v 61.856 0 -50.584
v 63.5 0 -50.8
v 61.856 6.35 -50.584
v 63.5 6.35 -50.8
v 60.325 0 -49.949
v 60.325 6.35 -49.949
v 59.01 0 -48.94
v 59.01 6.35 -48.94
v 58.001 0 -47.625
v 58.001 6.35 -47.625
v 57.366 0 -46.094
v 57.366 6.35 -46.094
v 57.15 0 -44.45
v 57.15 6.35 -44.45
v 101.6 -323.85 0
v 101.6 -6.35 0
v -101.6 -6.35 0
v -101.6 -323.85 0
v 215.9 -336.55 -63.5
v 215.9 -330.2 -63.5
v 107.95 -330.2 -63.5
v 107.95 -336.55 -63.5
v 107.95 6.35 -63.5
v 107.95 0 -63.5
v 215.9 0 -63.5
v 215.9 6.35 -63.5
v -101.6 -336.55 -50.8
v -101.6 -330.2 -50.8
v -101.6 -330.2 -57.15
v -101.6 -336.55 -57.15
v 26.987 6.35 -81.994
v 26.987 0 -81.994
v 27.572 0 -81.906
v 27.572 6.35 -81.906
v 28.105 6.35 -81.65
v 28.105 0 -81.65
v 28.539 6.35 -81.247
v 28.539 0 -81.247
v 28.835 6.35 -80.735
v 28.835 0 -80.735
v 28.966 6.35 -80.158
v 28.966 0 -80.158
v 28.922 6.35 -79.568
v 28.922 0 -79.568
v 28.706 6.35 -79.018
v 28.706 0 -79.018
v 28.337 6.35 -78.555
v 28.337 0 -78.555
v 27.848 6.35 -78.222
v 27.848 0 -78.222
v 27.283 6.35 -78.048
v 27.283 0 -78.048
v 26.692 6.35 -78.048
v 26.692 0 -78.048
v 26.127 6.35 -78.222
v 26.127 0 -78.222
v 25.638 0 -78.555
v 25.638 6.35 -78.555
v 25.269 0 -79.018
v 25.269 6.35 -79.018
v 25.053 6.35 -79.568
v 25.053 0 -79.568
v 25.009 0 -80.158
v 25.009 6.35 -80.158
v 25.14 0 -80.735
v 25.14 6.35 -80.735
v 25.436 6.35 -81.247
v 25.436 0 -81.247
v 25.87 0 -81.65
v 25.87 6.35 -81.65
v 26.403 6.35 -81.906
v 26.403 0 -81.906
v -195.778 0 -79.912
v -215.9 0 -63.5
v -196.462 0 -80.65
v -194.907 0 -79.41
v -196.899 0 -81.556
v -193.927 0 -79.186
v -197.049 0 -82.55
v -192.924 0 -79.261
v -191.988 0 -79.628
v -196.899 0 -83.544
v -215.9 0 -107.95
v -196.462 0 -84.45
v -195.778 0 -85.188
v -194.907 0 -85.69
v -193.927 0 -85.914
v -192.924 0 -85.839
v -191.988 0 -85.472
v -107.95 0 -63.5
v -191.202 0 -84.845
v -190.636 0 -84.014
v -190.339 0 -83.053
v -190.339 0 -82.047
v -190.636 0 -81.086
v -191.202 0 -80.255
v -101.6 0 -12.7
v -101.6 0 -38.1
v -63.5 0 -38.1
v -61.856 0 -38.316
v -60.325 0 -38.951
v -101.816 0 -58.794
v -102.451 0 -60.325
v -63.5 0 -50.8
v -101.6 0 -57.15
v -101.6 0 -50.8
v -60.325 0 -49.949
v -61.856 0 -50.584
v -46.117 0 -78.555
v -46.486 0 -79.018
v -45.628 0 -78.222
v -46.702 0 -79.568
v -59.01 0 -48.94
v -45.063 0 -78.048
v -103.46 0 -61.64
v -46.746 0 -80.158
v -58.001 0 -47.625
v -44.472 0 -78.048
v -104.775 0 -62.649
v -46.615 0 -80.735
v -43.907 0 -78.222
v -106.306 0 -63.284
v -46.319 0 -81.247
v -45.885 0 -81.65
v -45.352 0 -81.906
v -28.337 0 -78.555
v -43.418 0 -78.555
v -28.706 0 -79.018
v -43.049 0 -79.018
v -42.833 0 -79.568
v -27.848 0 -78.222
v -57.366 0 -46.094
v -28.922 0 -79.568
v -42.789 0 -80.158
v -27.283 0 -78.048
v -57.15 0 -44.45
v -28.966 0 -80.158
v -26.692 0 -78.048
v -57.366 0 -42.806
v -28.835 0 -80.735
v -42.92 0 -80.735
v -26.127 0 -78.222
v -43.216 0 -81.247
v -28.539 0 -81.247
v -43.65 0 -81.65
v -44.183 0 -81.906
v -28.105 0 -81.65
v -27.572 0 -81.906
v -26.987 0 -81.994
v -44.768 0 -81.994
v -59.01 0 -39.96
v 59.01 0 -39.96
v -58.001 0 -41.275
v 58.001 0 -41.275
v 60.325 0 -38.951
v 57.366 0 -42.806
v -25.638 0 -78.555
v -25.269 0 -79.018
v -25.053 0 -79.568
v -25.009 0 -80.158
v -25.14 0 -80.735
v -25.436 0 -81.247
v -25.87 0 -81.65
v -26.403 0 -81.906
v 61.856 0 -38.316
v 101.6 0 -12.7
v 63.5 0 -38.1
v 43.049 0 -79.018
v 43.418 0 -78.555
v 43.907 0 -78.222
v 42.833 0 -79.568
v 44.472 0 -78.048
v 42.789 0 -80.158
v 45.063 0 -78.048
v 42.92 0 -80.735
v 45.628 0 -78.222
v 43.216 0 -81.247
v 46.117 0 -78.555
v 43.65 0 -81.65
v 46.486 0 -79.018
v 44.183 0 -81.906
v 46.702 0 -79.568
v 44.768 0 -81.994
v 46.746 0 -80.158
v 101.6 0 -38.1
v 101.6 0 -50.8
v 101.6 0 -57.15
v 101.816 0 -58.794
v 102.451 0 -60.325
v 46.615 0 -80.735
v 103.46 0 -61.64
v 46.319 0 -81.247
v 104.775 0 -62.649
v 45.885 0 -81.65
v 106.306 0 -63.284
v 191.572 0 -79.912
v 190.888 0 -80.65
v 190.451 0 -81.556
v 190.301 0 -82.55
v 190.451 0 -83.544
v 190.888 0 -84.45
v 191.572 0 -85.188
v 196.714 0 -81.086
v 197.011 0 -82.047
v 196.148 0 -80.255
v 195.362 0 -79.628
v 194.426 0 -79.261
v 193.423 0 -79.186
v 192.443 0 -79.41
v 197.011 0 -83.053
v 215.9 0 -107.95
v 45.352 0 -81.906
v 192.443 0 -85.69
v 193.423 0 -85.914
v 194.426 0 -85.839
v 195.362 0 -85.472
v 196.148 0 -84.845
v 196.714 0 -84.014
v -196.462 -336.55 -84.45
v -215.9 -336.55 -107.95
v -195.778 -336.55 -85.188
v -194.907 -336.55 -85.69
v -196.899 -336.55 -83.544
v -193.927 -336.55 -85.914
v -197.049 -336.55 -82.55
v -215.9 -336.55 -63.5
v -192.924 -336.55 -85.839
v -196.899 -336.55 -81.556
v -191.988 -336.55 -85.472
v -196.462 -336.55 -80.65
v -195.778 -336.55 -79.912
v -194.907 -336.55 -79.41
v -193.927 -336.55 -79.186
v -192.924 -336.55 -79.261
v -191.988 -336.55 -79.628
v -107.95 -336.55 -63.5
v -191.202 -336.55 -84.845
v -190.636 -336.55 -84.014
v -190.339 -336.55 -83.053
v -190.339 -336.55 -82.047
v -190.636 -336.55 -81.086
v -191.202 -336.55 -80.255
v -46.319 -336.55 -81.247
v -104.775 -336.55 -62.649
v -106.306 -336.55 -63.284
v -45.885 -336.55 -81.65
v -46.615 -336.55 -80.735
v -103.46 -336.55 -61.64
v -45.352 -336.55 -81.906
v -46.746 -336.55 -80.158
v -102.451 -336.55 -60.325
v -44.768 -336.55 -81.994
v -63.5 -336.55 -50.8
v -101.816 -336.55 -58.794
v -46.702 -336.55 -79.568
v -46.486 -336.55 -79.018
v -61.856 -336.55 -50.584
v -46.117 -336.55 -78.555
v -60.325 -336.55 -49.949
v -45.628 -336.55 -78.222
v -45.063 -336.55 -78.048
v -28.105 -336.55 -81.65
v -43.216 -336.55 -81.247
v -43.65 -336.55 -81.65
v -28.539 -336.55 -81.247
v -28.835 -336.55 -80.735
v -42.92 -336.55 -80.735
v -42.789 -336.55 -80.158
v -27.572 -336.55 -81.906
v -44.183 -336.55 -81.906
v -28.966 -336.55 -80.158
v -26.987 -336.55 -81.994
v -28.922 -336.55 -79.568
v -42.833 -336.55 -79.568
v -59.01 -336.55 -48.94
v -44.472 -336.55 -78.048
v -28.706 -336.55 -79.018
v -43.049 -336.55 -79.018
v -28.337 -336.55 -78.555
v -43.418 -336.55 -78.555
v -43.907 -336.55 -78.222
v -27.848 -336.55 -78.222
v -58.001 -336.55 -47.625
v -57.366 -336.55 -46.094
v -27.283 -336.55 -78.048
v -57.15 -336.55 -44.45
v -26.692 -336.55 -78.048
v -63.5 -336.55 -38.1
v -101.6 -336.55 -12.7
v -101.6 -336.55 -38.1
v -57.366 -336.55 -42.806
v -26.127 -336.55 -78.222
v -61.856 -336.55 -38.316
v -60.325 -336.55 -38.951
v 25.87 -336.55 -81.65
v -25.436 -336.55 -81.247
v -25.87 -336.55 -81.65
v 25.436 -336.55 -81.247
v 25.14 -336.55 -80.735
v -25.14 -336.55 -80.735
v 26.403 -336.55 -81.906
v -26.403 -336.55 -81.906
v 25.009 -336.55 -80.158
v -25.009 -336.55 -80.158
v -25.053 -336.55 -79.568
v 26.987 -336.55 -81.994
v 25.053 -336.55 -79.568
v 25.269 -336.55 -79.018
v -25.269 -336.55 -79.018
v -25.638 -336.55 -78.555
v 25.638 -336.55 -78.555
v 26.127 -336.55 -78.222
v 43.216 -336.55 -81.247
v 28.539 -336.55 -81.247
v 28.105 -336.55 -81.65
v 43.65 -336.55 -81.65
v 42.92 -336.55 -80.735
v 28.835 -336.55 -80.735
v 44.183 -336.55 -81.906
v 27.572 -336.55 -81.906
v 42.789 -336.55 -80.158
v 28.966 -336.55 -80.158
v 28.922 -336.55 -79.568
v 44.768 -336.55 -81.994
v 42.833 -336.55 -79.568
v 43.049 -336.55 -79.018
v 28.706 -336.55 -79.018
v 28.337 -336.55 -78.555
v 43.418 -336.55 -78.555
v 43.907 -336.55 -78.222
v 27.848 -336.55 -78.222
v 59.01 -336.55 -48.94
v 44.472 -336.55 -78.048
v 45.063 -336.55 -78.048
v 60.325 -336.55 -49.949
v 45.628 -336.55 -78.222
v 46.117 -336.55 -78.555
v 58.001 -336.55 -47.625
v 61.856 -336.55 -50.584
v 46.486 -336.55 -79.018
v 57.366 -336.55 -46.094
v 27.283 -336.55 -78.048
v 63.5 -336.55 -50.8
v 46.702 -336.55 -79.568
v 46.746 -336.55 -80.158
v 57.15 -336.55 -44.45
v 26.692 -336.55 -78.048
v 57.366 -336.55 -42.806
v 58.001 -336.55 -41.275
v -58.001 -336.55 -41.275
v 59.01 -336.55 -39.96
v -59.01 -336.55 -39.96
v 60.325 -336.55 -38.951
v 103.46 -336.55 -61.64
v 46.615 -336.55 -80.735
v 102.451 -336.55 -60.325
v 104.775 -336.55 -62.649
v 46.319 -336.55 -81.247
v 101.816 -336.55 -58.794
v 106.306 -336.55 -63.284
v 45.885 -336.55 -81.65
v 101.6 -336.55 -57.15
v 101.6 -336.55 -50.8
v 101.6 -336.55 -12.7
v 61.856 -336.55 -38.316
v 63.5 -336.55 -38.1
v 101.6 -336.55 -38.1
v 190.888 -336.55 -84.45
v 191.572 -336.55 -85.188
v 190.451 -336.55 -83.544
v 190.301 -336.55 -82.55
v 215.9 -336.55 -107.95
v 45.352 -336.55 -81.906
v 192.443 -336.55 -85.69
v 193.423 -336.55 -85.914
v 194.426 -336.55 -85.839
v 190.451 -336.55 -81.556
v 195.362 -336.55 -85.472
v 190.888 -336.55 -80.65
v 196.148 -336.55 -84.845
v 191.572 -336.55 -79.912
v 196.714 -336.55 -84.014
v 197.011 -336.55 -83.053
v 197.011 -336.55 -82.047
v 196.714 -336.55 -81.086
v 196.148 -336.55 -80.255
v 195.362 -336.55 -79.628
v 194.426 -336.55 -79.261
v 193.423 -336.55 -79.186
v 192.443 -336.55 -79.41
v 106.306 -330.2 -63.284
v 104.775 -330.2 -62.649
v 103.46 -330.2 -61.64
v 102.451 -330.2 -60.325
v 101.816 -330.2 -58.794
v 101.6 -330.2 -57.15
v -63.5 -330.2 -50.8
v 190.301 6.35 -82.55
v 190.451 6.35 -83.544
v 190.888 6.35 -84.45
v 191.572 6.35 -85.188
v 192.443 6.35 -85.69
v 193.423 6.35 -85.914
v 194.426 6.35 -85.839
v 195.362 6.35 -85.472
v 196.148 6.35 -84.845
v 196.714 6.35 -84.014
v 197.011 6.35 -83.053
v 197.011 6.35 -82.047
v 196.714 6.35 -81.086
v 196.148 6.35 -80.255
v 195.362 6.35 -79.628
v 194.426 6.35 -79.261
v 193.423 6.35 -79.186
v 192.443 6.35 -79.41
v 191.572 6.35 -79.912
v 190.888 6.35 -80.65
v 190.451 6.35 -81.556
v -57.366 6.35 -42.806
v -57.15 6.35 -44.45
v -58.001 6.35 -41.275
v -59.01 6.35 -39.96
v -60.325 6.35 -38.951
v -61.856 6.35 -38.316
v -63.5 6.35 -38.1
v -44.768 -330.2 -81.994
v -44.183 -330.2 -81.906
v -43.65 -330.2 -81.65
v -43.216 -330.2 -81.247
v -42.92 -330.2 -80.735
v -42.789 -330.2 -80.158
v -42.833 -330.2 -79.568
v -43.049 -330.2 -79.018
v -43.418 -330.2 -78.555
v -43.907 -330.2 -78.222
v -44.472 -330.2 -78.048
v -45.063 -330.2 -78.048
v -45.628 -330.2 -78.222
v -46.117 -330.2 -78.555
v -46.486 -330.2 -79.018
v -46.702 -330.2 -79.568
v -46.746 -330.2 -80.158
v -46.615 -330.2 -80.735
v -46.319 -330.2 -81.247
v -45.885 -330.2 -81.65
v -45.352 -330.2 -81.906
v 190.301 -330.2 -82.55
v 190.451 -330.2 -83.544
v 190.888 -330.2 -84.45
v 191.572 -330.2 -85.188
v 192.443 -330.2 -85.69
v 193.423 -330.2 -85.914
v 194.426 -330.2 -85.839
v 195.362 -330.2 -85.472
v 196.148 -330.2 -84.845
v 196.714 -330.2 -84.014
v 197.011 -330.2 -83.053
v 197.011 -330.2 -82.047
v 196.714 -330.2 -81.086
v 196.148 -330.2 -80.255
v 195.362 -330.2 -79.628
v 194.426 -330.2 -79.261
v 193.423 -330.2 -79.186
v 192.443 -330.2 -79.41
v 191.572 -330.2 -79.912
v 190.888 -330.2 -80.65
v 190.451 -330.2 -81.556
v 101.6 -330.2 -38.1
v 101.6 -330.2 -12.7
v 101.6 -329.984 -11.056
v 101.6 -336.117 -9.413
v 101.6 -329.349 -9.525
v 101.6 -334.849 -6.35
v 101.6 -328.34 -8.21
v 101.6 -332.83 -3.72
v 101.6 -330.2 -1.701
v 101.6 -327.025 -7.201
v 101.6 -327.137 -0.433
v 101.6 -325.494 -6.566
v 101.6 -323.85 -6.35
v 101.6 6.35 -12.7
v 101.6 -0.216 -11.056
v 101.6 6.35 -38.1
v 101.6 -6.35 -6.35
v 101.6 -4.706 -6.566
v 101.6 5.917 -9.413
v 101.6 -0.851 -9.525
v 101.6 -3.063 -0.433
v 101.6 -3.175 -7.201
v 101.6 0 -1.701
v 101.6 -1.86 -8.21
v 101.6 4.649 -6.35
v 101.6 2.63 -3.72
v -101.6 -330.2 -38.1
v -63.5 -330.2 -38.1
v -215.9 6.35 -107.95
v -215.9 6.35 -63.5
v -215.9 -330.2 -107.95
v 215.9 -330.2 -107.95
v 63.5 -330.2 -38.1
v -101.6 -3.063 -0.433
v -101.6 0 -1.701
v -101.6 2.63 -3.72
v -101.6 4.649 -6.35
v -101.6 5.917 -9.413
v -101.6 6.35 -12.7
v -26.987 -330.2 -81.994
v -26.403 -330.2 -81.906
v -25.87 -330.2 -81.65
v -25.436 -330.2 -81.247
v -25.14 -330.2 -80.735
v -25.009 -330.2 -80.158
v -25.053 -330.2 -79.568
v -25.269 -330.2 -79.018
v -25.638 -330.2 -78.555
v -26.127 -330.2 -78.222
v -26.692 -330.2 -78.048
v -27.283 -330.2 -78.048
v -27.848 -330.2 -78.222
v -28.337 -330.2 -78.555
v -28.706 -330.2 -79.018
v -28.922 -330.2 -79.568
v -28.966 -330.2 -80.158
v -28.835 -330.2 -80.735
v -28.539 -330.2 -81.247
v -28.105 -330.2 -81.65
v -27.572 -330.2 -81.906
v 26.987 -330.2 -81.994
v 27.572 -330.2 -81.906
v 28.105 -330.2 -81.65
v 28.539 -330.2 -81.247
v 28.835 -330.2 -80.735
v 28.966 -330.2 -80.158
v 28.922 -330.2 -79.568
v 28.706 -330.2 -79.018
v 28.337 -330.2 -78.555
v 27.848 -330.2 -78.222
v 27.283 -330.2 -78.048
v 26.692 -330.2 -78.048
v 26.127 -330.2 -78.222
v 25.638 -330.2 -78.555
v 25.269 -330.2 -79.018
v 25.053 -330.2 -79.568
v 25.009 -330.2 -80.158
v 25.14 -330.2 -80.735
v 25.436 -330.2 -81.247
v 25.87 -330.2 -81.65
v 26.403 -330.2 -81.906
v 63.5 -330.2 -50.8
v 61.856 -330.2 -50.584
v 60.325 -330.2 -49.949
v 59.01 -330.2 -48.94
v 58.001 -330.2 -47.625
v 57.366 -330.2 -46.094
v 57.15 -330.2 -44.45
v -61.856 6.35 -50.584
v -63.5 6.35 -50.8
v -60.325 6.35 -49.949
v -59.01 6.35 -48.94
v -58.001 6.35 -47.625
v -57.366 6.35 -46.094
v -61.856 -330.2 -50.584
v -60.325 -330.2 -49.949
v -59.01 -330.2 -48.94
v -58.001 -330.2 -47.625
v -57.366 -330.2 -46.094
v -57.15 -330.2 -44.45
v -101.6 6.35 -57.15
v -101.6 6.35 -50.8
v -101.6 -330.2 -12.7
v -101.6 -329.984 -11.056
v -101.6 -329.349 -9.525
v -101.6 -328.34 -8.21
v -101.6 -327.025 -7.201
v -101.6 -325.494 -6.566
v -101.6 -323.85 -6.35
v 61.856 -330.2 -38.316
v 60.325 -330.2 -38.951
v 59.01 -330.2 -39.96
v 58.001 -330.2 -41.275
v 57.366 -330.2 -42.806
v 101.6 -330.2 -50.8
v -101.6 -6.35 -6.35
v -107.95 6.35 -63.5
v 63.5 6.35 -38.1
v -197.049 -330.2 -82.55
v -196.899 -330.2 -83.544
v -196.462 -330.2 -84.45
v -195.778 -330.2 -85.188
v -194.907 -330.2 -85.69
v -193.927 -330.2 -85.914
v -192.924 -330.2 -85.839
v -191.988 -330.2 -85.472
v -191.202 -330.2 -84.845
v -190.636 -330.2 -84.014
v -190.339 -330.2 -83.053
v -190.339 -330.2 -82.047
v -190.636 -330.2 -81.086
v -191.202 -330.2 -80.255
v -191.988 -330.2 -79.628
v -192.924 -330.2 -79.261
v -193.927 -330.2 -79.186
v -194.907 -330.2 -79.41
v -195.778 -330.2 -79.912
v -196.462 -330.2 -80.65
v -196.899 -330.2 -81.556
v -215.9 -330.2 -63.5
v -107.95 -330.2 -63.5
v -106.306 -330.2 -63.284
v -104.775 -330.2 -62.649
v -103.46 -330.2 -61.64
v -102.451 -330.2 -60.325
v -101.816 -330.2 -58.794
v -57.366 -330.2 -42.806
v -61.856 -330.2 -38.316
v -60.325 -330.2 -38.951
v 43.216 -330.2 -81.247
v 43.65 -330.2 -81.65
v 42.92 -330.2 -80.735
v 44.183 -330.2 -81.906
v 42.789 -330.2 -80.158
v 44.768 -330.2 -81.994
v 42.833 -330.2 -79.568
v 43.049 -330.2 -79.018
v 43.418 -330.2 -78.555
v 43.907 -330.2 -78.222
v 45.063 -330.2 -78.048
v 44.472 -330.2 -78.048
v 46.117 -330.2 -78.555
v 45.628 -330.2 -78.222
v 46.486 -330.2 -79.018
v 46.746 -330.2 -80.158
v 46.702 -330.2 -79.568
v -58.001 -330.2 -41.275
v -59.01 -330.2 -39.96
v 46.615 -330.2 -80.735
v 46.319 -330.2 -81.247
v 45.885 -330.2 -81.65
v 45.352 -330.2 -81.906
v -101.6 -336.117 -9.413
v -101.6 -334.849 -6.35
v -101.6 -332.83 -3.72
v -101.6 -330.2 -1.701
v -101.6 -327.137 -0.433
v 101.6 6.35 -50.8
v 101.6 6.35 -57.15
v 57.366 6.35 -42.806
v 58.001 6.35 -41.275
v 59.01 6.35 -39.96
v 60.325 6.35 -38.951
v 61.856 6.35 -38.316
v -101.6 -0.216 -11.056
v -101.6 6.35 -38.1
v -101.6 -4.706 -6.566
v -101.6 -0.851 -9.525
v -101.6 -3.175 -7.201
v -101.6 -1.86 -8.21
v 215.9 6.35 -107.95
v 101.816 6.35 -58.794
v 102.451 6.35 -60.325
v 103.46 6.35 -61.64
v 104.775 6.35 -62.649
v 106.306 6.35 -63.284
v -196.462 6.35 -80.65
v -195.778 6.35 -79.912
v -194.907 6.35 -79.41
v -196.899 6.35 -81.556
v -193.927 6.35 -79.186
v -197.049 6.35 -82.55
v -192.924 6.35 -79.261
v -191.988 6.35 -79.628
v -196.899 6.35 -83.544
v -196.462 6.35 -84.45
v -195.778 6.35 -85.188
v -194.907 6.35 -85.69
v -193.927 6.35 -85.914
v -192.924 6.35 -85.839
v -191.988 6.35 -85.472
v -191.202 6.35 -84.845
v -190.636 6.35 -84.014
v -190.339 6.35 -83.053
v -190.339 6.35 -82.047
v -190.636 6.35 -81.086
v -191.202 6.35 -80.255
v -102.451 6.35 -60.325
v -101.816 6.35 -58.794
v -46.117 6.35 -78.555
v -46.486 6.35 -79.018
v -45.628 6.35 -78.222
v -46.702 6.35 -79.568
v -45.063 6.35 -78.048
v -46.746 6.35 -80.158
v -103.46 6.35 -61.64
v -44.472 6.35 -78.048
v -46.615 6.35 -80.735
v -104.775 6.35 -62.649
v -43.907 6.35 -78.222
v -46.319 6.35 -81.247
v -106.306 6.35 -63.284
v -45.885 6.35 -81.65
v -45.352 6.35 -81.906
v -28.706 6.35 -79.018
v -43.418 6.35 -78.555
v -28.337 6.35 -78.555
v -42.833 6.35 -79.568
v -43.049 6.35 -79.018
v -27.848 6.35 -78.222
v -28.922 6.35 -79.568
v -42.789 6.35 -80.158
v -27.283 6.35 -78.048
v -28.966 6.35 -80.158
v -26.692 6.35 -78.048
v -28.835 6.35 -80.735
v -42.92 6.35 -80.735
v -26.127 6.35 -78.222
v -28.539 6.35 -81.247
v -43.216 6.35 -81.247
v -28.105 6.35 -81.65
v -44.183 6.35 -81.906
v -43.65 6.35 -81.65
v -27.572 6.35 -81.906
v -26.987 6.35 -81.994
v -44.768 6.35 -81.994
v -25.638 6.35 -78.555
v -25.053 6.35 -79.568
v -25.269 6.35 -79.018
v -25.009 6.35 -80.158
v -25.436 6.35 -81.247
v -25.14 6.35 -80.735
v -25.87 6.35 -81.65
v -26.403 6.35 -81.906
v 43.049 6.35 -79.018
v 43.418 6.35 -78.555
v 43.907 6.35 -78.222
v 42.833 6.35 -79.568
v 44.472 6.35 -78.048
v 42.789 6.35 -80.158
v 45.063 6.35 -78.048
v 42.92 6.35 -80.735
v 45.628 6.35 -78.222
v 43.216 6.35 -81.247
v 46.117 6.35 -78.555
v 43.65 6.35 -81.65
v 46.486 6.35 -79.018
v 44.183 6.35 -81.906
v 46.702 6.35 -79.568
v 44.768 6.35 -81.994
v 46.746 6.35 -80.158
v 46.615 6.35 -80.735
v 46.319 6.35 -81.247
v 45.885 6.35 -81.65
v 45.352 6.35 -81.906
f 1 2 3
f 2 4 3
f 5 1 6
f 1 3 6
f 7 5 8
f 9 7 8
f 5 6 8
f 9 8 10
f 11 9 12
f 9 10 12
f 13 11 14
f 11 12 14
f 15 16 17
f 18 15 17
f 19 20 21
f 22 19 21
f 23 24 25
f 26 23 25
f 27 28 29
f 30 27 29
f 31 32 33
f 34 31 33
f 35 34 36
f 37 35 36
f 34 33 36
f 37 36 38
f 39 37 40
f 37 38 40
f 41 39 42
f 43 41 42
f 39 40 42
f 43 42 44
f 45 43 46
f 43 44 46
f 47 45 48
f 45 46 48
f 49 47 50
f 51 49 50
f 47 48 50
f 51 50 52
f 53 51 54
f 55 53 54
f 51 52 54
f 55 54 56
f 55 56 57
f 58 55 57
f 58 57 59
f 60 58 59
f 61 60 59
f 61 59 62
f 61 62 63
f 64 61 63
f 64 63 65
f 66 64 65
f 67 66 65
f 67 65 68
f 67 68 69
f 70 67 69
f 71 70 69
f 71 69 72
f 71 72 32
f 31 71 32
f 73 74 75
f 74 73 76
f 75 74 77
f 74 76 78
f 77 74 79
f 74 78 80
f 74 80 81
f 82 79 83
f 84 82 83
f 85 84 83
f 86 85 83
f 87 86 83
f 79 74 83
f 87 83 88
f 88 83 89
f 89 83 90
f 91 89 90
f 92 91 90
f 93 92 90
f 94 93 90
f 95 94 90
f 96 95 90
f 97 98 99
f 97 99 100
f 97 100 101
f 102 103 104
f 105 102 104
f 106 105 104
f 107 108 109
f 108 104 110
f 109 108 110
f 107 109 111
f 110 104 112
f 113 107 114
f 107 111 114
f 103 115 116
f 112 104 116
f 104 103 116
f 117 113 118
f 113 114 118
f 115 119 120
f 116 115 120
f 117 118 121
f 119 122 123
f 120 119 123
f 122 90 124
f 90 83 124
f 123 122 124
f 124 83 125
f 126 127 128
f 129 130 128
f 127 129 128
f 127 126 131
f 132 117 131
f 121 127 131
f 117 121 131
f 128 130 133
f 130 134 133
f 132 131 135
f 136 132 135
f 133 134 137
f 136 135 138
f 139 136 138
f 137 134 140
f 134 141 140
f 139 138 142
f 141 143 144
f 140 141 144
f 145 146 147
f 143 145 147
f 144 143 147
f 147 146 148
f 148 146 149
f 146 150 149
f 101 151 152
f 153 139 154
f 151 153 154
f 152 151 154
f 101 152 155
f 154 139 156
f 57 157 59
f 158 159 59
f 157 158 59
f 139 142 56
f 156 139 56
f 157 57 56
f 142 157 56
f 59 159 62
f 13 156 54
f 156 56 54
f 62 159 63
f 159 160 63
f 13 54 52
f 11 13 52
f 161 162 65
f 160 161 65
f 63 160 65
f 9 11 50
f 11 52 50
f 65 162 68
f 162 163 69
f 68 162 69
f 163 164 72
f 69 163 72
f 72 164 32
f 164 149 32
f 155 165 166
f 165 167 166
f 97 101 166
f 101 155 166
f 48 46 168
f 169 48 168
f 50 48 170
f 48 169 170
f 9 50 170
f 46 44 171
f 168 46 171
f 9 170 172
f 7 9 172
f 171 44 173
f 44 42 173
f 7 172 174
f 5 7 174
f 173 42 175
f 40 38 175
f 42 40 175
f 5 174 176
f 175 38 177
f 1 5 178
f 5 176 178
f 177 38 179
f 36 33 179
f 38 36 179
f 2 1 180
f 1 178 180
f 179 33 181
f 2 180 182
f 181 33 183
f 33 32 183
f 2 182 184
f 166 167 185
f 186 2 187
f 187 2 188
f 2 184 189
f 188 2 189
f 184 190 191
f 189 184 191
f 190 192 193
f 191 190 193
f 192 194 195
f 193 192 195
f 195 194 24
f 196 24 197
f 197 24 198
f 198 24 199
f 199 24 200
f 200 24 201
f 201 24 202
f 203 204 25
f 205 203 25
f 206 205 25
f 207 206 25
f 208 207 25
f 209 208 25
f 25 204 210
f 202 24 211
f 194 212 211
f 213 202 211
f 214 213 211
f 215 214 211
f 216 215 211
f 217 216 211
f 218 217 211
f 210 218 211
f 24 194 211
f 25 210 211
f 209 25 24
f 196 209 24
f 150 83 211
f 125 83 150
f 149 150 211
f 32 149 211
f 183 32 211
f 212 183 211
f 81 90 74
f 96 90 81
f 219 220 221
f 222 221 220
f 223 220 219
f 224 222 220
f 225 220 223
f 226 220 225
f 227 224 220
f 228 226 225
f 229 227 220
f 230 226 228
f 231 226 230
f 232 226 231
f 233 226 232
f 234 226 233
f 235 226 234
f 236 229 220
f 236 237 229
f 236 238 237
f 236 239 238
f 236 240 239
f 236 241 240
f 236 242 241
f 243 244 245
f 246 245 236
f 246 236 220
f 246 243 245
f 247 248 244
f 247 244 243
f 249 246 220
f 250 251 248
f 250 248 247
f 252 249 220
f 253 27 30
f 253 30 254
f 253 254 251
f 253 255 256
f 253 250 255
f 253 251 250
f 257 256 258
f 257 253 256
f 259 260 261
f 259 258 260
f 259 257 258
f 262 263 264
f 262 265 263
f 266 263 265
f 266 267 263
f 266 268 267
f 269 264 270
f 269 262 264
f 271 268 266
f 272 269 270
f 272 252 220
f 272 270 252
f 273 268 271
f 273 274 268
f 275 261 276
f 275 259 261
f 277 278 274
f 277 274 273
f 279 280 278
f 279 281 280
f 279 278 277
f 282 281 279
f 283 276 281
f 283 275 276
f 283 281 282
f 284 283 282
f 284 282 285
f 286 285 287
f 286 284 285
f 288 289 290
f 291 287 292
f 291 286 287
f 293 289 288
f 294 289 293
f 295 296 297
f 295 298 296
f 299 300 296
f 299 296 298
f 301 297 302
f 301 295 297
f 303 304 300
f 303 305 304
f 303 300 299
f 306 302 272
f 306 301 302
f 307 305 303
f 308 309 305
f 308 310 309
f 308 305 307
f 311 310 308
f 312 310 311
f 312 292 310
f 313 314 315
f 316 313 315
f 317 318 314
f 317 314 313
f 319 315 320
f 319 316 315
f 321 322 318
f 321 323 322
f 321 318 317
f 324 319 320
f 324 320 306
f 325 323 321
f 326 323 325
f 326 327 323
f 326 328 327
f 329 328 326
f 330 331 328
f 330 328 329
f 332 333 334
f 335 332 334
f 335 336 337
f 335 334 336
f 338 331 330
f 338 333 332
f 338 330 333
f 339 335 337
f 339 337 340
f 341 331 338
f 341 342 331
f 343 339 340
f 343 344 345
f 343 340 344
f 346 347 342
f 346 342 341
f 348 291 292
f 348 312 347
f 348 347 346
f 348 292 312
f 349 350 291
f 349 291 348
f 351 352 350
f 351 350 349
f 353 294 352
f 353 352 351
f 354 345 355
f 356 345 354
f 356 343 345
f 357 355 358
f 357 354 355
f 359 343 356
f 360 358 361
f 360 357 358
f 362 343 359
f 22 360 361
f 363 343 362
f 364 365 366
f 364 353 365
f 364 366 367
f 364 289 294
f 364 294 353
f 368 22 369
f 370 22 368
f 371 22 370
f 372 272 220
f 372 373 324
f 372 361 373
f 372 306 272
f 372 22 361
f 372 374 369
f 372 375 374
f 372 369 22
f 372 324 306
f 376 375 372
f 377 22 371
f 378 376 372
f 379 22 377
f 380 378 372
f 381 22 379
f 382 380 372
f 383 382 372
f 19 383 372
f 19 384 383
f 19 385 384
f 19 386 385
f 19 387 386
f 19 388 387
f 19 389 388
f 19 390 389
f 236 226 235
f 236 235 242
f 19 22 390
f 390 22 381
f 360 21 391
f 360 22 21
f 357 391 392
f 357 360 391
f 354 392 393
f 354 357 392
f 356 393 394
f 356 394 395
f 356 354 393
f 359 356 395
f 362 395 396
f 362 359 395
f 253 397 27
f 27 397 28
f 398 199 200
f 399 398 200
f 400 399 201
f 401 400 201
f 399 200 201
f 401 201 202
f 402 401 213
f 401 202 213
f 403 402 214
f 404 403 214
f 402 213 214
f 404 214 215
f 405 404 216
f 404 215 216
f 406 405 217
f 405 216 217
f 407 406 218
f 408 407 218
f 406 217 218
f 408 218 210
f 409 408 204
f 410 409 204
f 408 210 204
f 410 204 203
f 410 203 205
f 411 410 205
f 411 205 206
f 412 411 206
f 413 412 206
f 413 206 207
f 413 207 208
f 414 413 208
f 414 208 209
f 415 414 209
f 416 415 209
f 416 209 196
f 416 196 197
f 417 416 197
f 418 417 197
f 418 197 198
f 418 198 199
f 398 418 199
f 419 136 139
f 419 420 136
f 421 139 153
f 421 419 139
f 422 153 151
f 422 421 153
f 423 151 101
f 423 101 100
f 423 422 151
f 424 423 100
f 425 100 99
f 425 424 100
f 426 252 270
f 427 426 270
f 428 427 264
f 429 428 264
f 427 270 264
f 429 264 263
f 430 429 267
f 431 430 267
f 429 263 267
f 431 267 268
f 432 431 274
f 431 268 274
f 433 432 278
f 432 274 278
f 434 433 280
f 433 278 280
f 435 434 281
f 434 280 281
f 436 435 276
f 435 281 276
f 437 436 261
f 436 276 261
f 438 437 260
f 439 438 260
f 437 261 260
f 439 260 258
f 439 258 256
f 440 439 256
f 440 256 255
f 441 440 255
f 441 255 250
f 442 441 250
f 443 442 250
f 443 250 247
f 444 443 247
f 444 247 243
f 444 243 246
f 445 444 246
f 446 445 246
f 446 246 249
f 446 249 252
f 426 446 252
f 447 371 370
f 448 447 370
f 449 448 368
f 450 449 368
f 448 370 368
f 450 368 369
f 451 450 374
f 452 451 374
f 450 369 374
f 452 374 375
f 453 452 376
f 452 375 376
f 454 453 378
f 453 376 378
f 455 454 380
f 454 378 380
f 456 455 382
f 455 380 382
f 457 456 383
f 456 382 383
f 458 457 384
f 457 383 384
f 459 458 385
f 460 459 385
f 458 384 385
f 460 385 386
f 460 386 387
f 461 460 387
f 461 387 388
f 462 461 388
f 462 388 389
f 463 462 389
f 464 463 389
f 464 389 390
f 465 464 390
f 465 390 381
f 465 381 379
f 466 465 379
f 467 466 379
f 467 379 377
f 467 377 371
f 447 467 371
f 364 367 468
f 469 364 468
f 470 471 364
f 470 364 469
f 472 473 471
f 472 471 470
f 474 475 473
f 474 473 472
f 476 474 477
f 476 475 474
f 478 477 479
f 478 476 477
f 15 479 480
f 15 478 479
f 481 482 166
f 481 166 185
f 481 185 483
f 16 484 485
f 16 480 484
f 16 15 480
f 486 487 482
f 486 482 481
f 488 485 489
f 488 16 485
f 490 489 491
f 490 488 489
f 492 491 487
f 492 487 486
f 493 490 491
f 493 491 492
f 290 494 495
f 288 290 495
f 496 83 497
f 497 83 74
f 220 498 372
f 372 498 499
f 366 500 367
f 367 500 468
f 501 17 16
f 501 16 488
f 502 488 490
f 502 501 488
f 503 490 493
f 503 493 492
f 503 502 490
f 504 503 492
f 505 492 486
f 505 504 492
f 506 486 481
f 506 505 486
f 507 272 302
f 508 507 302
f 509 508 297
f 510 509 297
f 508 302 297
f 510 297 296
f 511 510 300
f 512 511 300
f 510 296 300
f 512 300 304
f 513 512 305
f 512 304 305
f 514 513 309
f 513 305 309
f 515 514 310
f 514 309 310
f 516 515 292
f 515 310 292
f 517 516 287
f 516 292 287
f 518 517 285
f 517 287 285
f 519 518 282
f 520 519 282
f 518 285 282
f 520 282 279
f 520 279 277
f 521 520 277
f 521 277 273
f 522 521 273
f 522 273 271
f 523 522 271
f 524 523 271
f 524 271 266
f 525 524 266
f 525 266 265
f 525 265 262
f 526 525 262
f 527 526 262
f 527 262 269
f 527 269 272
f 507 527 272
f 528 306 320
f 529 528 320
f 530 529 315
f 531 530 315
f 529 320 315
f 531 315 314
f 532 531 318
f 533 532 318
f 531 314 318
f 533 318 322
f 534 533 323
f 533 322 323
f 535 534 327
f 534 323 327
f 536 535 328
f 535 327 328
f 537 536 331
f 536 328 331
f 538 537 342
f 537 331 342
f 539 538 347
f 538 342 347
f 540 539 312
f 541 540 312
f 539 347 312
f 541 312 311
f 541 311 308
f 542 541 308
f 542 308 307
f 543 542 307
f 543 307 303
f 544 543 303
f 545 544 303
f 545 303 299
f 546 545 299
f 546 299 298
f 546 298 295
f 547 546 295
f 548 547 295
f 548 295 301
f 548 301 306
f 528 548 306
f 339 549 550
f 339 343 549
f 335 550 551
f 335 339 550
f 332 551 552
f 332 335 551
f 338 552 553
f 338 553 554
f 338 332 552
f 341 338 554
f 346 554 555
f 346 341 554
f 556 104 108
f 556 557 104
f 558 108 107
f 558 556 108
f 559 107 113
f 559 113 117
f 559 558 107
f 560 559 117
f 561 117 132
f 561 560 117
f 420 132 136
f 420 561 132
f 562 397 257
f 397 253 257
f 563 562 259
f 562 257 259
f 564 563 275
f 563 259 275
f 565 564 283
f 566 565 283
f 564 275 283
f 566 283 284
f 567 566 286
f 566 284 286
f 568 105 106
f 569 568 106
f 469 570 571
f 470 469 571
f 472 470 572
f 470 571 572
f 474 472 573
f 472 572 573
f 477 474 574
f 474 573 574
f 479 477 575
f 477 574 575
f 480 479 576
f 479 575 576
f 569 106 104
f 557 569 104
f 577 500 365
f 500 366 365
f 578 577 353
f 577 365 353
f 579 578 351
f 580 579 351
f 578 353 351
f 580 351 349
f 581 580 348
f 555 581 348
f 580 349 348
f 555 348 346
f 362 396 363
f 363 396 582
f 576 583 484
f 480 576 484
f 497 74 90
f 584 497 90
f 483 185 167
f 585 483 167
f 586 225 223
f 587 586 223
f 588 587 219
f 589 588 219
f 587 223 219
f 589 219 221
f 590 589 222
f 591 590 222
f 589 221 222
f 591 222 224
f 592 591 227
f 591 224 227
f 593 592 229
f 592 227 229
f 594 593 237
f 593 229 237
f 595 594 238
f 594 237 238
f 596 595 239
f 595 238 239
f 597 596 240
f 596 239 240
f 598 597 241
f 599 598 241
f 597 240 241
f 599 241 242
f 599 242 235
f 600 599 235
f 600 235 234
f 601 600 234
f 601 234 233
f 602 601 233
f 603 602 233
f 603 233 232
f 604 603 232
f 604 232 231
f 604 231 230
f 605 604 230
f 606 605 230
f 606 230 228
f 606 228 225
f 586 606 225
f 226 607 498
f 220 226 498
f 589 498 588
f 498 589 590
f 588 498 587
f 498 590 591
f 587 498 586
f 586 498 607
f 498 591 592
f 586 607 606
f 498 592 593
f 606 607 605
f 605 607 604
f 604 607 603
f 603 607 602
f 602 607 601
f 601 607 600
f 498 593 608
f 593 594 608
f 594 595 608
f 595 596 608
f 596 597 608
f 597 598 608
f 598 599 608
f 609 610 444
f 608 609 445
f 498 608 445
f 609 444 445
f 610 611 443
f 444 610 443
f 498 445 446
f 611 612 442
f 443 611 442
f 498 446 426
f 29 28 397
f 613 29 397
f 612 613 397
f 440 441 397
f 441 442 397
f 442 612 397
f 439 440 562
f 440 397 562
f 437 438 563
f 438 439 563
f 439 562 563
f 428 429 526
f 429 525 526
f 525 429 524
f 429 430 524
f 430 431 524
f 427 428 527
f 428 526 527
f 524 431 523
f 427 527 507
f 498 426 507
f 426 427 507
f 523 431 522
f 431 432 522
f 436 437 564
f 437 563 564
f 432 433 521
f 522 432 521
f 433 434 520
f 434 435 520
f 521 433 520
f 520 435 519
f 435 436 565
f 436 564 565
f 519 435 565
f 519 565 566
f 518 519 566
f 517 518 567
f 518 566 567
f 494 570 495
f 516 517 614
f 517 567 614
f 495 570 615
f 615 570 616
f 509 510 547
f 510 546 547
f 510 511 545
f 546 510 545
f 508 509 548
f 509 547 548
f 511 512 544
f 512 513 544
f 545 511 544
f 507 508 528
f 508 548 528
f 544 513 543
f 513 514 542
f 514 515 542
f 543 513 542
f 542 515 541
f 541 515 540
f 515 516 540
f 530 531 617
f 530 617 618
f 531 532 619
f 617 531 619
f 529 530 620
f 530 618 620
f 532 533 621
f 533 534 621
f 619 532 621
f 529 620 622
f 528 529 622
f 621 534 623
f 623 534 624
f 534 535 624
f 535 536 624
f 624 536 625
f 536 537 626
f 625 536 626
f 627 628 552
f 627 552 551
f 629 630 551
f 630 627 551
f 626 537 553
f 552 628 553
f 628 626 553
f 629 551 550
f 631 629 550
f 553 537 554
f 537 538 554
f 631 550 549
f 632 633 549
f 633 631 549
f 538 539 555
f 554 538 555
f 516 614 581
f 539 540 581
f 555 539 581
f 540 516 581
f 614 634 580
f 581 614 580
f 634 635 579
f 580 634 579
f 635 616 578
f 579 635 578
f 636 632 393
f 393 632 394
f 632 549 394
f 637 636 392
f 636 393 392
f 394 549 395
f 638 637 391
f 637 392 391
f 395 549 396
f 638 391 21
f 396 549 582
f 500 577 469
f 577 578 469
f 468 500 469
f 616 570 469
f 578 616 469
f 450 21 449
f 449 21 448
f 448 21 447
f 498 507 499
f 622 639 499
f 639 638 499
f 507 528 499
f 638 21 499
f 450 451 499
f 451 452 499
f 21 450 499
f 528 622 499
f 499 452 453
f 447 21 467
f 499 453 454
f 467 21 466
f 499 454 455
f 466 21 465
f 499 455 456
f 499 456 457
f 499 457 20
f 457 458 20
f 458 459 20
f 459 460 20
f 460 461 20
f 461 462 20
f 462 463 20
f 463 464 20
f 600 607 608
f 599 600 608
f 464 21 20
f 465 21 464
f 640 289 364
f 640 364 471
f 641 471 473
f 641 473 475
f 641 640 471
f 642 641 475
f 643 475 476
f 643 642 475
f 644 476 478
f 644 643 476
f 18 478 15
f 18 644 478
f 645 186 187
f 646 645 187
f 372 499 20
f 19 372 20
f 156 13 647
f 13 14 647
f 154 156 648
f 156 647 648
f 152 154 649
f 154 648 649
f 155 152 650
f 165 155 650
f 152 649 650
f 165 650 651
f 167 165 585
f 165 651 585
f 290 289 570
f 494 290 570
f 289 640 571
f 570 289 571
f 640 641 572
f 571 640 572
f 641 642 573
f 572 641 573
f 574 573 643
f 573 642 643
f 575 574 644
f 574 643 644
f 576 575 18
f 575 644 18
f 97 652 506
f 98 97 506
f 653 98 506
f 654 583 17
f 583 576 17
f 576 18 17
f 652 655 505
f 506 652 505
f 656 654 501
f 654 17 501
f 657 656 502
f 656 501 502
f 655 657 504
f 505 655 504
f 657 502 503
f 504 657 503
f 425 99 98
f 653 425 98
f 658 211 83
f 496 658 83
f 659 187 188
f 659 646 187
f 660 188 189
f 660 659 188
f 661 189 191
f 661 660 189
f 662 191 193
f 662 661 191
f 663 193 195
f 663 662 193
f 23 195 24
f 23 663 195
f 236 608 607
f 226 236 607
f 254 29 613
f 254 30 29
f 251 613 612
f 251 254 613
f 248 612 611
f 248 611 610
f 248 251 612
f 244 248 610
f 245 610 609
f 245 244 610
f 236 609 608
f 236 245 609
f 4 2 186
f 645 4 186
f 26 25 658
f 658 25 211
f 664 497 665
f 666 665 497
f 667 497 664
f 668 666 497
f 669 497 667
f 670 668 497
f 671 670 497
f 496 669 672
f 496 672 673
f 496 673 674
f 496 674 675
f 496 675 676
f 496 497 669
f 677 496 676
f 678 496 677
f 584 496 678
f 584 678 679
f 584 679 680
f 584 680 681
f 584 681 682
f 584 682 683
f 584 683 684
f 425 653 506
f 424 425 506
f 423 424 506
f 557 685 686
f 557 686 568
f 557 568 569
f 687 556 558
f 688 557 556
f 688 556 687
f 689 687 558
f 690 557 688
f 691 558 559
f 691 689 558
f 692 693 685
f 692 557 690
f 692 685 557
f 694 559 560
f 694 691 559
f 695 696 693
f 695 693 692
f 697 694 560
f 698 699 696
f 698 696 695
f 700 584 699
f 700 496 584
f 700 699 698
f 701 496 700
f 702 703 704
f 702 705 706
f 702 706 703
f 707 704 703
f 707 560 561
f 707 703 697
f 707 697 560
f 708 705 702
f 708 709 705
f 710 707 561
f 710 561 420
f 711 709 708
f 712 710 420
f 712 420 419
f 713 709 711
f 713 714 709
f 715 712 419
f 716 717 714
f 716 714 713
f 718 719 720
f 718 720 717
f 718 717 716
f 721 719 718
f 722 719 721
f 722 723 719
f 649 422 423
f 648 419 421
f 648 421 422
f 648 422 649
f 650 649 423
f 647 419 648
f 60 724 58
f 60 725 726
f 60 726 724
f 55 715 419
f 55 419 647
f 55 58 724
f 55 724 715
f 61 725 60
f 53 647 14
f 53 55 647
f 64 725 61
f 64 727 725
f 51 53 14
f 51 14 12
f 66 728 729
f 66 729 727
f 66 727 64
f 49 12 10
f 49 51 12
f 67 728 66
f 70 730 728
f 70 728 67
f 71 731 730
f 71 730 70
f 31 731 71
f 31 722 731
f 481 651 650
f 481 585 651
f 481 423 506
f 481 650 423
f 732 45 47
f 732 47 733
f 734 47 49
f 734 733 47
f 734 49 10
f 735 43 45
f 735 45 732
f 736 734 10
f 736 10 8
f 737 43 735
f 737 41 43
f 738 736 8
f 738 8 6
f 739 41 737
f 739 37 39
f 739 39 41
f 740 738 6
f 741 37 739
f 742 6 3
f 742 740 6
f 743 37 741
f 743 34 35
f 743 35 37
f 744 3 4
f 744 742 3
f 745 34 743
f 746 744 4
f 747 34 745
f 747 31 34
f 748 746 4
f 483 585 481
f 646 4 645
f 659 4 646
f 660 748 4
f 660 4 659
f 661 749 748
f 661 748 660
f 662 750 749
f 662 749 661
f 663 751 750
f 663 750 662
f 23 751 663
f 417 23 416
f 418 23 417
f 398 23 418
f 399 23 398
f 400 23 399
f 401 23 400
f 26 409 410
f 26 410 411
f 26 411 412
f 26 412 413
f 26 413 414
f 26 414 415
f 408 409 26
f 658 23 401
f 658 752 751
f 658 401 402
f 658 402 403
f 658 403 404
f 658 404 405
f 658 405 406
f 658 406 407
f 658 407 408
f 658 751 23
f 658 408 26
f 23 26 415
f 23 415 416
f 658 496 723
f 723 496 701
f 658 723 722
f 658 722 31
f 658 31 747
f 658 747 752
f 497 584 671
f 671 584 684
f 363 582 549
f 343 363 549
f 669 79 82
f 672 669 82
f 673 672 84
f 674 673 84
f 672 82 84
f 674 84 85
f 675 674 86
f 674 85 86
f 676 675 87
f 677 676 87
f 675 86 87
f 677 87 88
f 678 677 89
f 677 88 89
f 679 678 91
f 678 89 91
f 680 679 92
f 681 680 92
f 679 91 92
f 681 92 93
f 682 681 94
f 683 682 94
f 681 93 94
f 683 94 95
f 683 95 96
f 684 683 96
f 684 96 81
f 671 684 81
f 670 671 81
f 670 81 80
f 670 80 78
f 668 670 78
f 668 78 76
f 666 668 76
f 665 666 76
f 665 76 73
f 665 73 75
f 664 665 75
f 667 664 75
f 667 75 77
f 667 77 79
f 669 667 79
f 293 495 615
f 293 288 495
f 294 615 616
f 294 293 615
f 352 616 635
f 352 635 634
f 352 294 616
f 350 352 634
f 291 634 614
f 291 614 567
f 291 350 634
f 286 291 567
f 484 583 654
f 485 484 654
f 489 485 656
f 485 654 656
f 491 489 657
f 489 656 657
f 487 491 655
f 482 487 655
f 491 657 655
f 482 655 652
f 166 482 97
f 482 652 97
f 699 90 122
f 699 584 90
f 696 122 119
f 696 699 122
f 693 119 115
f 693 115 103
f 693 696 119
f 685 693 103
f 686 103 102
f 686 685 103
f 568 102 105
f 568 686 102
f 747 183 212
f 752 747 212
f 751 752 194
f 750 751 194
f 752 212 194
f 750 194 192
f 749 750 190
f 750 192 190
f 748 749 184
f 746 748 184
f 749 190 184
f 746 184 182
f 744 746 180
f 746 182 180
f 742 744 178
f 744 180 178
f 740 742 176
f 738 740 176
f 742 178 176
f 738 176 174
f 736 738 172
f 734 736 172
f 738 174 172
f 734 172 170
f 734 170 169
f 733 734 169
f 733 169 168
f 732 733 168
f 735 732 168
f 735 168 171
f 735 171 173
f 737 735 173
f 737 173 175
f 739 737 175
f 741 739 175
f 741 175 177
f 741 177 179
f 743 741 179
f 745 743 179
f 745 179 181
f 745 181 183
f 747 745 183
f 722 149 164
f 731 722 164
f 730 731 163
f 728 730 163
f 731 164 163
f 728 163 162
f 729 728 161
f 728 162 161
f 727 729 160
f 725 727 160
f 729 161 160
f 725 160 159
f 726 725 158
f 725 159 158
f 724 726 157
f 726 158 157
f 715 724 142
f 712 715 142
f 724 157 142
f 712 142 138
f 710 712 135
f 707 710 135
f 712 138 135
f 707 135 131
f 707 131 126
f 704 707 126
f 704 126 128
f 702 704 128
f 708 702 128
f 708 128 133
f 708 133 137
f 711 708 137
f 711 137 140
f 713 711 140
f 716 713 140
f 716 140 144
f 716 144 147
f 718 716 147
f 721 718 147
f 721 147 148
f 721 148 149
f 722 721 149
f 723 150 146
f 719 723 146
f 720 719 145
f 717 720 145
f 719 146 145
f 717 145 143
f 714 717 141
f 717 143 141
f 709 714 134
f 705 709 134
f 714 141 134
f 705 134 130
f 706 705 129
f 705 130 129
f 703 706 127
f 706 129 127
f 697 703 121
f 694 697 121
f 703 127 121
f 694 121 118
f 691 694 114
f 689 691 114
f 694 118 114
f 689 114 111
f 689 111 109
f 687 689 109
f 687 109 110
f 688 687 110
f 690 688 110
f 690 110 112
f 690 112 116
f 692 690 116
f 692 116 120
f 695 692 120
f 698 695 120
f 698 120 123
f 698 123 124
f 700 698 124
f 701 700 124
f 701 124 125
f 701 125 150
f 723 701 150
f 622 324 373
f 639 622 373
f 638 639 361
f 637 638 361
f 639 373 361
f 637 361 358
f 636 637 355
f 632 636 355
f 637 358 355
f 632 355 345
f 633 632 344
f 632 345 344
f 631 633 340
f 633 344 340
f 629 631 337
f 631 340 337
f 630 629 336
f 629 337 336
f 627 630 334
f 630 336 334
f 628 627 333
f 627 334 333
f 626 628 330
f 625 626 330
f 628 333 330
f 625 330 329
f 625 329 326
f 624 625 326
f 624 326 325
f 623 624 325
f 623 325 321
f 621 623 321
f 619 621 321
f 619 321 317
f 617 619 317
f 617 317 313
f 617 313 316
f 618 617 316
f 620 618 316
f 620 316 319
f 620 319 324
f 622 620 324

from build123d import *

# Parameters (mm, degrees)
BOSS_EXTRUDE1_DEPTH              = 6.35
SKETCH2_W                        = 203.2
SKETCH2_H                        = 6.35
BOSS_EXTRUDE2_DEPTH              = 330.2
BOSS_EXTRUDE3_DEPTH              = 6.35
F_17_64_0_26563_DIAMETER_HOLE1_D = 6.747002
CONVERT_SOLID1_START             = -101.6
CONVERT_SOLID1_DEPTH             = 203.2
CONVERT_SOLID1_2_DEPTH           = 203.2
F_5_32_0_15625_DIAMETER_HOLE1_D  = 3.96875
FILLET1_R                        = 6.35
FILLET2_R                        = 6.35


# Read off the part's stored shape, not the designer's step: Convert-Solid1
with BuildPart() as part:
    # Sketch1 → Boss-Extrude1 (new body)
    with BuildSketch(Plane(origin=(0, 0, 0), x_dir=(1, 0, 0), z_dir=(0, 1, 0))):
        Polygon((-215.9, 107.95), (-215.9, 63.5), (-101.6, 63.5), (-101.6, 50.8), (-57.15, 50.8), (-57.15, 38.1), (-101.6, 38.1), (-101.6, 0), (101.6, 0), (101.6, 38.1), (57.15, 38.1), (57.15, 50.8), (101.6, 50.8), (101.6, 63.5), (215.9, 63.5), (215.9, 107.95), align=None)
    extrude(amount=BOSS_EXTRUDE1_DEPTH)

    # Sketch2 → Boss-Extrude2 (add)
    with BuildSketch(Plane.XZ):
        with Locations((0, -3.175)):
            Rectangle(SKETCH2_W, SKETCH2_H)
    extrude(amount=BOSS_EXTRUDE2_DEPTH)

    # Sketch3 → Boss-Extrude3 (add)
    with BuildSketch(Plane.XZ.offset(330.2)):
        Polygon((-215.9, -107.95), (215.9, -107.95), (215.9, -63.5), (101.6, -63.5), (101.6, -50.8), (57.15, -50.8), (57.15, -38.1), (101.6, -38.1), (101.6, 0), (-101.6, 0), (-101.6, -38.1), (-57.15, -38.1), (-57.15, -50.8), (-101.6, -50.8), (-101.6, -63.5), (-215.9, -63.5), align=None)
    extrude(amount=BOSS_EXTRUDE3_DEPTH)

    # 17/64 (0.26563) Diameter Hole1 (through all)
    with Locations(Plane(origin=(0, 6.35, 0), x_dir=(1, 0, 0), z_dir=(0, 1, 0))):
        with Locations((-193.675, 82.55), (193.675, 82.55)):
            Hole(F_17_64_0_26563_DIAMETER_HOLE1_D / 2)

    # Convert-Solid1 outline → Convert-Solid1 (cut)
    with BuildSketch(Plane.YZ.offset(CONVERT_SOLID1_START)):
        with BuildLine():
            Line((6.35, 0), (-6.35, 0))
            ThreePointArc((-6.35, 0), (2.630256121, -3.719743879), (6.35, -12.7))
            Line((6.35, -12.7), (6.35, 0))
        make_face()
        with BuildLine():
            ThreePointArc((-336.55, -12.7), (-332.830256121, -3.719743879), (-323.85, 0))
            Line((-323.85, 0), (-336.55, 0))
            Line((-336.55, 0), (-336.55, -12.7))
        make_face()
    extrude(amount=CONVERT_SOLID1_DEPTH, mode=Mode.SUBTRACT)

    # Convert-Solid1 2 outline → Convert-Solid1 2 (add)
    with BuildSketch(Plane.YZ.offset(CONVERT_SOLID1_START)):
        with BuildLine():
            Line((0, -6.35), (-6.35, -6.35))
            ThreePointArc((-6.35, -6.35), (-1.859871939, -8.209871939), (0, -12.7))
            Line((0, -12.7), (0, -6.35))
        make_face()
        with BuildLine():
            ThreePointArc((-330.2, -12.7), (-328.340128061, -8.209871939), (-323.85, -6.35))
            Line((-323.85, -6.35), (-330.2, -6.35))
            Line((-330.2, -6.35), (-330.2, -12.7))
        make_face()
    extrude(amount=CONVERT_SOLID1_2_DEPTH)

    # 5/32 (0.15625) Diameter Hole1 (through all)
    with Locations(Plane(origin=(-44.7675, 6.35, -80.01), x_dir=(0, 0, 1), z_dir=(0, 1, 0))):
        with Locations((0, 0), (0, 17.78), (0, 71.755), (0, 89.535)):
            Hole(F_5_32_0_15625_DIAMETER_HOLE1_D / 2)

    # Fillet1
    fillet1_edges = [part.edges().sort_by_distance(p)[0] for p in [
        (57.15, -333.375, -38.1),
        (57.15, -333.375, -50.8),
        (57.15, 3.175, -38.1),
        (57.15, 3.175, -50.8),
        (-57.15, -333.375, -50.8),
        (-57.15, 3.175, -38.1),
        (-57.15, -333.375, -38.1),
        (-57.15, 3.175, -50.8),
    ]]
    fillet(fillet1_edges, radius=FILLET1_R - 0.0001)  # a hair under: the kernel refuses the full size

    # Fillet2
    fillet2_edges = [part.edges().sort_by_distance(p)[0] for p in [
        (101.6, 3.175, -63.5),
        (-101.6, 3.175, -63.5),
        (-101.6, -333.375, -63.5),
        (101.6, -333.375, -63.5),
    ]]
    fillet(fillet2_edges, radius=FILLET2_R)


solid = part.part
